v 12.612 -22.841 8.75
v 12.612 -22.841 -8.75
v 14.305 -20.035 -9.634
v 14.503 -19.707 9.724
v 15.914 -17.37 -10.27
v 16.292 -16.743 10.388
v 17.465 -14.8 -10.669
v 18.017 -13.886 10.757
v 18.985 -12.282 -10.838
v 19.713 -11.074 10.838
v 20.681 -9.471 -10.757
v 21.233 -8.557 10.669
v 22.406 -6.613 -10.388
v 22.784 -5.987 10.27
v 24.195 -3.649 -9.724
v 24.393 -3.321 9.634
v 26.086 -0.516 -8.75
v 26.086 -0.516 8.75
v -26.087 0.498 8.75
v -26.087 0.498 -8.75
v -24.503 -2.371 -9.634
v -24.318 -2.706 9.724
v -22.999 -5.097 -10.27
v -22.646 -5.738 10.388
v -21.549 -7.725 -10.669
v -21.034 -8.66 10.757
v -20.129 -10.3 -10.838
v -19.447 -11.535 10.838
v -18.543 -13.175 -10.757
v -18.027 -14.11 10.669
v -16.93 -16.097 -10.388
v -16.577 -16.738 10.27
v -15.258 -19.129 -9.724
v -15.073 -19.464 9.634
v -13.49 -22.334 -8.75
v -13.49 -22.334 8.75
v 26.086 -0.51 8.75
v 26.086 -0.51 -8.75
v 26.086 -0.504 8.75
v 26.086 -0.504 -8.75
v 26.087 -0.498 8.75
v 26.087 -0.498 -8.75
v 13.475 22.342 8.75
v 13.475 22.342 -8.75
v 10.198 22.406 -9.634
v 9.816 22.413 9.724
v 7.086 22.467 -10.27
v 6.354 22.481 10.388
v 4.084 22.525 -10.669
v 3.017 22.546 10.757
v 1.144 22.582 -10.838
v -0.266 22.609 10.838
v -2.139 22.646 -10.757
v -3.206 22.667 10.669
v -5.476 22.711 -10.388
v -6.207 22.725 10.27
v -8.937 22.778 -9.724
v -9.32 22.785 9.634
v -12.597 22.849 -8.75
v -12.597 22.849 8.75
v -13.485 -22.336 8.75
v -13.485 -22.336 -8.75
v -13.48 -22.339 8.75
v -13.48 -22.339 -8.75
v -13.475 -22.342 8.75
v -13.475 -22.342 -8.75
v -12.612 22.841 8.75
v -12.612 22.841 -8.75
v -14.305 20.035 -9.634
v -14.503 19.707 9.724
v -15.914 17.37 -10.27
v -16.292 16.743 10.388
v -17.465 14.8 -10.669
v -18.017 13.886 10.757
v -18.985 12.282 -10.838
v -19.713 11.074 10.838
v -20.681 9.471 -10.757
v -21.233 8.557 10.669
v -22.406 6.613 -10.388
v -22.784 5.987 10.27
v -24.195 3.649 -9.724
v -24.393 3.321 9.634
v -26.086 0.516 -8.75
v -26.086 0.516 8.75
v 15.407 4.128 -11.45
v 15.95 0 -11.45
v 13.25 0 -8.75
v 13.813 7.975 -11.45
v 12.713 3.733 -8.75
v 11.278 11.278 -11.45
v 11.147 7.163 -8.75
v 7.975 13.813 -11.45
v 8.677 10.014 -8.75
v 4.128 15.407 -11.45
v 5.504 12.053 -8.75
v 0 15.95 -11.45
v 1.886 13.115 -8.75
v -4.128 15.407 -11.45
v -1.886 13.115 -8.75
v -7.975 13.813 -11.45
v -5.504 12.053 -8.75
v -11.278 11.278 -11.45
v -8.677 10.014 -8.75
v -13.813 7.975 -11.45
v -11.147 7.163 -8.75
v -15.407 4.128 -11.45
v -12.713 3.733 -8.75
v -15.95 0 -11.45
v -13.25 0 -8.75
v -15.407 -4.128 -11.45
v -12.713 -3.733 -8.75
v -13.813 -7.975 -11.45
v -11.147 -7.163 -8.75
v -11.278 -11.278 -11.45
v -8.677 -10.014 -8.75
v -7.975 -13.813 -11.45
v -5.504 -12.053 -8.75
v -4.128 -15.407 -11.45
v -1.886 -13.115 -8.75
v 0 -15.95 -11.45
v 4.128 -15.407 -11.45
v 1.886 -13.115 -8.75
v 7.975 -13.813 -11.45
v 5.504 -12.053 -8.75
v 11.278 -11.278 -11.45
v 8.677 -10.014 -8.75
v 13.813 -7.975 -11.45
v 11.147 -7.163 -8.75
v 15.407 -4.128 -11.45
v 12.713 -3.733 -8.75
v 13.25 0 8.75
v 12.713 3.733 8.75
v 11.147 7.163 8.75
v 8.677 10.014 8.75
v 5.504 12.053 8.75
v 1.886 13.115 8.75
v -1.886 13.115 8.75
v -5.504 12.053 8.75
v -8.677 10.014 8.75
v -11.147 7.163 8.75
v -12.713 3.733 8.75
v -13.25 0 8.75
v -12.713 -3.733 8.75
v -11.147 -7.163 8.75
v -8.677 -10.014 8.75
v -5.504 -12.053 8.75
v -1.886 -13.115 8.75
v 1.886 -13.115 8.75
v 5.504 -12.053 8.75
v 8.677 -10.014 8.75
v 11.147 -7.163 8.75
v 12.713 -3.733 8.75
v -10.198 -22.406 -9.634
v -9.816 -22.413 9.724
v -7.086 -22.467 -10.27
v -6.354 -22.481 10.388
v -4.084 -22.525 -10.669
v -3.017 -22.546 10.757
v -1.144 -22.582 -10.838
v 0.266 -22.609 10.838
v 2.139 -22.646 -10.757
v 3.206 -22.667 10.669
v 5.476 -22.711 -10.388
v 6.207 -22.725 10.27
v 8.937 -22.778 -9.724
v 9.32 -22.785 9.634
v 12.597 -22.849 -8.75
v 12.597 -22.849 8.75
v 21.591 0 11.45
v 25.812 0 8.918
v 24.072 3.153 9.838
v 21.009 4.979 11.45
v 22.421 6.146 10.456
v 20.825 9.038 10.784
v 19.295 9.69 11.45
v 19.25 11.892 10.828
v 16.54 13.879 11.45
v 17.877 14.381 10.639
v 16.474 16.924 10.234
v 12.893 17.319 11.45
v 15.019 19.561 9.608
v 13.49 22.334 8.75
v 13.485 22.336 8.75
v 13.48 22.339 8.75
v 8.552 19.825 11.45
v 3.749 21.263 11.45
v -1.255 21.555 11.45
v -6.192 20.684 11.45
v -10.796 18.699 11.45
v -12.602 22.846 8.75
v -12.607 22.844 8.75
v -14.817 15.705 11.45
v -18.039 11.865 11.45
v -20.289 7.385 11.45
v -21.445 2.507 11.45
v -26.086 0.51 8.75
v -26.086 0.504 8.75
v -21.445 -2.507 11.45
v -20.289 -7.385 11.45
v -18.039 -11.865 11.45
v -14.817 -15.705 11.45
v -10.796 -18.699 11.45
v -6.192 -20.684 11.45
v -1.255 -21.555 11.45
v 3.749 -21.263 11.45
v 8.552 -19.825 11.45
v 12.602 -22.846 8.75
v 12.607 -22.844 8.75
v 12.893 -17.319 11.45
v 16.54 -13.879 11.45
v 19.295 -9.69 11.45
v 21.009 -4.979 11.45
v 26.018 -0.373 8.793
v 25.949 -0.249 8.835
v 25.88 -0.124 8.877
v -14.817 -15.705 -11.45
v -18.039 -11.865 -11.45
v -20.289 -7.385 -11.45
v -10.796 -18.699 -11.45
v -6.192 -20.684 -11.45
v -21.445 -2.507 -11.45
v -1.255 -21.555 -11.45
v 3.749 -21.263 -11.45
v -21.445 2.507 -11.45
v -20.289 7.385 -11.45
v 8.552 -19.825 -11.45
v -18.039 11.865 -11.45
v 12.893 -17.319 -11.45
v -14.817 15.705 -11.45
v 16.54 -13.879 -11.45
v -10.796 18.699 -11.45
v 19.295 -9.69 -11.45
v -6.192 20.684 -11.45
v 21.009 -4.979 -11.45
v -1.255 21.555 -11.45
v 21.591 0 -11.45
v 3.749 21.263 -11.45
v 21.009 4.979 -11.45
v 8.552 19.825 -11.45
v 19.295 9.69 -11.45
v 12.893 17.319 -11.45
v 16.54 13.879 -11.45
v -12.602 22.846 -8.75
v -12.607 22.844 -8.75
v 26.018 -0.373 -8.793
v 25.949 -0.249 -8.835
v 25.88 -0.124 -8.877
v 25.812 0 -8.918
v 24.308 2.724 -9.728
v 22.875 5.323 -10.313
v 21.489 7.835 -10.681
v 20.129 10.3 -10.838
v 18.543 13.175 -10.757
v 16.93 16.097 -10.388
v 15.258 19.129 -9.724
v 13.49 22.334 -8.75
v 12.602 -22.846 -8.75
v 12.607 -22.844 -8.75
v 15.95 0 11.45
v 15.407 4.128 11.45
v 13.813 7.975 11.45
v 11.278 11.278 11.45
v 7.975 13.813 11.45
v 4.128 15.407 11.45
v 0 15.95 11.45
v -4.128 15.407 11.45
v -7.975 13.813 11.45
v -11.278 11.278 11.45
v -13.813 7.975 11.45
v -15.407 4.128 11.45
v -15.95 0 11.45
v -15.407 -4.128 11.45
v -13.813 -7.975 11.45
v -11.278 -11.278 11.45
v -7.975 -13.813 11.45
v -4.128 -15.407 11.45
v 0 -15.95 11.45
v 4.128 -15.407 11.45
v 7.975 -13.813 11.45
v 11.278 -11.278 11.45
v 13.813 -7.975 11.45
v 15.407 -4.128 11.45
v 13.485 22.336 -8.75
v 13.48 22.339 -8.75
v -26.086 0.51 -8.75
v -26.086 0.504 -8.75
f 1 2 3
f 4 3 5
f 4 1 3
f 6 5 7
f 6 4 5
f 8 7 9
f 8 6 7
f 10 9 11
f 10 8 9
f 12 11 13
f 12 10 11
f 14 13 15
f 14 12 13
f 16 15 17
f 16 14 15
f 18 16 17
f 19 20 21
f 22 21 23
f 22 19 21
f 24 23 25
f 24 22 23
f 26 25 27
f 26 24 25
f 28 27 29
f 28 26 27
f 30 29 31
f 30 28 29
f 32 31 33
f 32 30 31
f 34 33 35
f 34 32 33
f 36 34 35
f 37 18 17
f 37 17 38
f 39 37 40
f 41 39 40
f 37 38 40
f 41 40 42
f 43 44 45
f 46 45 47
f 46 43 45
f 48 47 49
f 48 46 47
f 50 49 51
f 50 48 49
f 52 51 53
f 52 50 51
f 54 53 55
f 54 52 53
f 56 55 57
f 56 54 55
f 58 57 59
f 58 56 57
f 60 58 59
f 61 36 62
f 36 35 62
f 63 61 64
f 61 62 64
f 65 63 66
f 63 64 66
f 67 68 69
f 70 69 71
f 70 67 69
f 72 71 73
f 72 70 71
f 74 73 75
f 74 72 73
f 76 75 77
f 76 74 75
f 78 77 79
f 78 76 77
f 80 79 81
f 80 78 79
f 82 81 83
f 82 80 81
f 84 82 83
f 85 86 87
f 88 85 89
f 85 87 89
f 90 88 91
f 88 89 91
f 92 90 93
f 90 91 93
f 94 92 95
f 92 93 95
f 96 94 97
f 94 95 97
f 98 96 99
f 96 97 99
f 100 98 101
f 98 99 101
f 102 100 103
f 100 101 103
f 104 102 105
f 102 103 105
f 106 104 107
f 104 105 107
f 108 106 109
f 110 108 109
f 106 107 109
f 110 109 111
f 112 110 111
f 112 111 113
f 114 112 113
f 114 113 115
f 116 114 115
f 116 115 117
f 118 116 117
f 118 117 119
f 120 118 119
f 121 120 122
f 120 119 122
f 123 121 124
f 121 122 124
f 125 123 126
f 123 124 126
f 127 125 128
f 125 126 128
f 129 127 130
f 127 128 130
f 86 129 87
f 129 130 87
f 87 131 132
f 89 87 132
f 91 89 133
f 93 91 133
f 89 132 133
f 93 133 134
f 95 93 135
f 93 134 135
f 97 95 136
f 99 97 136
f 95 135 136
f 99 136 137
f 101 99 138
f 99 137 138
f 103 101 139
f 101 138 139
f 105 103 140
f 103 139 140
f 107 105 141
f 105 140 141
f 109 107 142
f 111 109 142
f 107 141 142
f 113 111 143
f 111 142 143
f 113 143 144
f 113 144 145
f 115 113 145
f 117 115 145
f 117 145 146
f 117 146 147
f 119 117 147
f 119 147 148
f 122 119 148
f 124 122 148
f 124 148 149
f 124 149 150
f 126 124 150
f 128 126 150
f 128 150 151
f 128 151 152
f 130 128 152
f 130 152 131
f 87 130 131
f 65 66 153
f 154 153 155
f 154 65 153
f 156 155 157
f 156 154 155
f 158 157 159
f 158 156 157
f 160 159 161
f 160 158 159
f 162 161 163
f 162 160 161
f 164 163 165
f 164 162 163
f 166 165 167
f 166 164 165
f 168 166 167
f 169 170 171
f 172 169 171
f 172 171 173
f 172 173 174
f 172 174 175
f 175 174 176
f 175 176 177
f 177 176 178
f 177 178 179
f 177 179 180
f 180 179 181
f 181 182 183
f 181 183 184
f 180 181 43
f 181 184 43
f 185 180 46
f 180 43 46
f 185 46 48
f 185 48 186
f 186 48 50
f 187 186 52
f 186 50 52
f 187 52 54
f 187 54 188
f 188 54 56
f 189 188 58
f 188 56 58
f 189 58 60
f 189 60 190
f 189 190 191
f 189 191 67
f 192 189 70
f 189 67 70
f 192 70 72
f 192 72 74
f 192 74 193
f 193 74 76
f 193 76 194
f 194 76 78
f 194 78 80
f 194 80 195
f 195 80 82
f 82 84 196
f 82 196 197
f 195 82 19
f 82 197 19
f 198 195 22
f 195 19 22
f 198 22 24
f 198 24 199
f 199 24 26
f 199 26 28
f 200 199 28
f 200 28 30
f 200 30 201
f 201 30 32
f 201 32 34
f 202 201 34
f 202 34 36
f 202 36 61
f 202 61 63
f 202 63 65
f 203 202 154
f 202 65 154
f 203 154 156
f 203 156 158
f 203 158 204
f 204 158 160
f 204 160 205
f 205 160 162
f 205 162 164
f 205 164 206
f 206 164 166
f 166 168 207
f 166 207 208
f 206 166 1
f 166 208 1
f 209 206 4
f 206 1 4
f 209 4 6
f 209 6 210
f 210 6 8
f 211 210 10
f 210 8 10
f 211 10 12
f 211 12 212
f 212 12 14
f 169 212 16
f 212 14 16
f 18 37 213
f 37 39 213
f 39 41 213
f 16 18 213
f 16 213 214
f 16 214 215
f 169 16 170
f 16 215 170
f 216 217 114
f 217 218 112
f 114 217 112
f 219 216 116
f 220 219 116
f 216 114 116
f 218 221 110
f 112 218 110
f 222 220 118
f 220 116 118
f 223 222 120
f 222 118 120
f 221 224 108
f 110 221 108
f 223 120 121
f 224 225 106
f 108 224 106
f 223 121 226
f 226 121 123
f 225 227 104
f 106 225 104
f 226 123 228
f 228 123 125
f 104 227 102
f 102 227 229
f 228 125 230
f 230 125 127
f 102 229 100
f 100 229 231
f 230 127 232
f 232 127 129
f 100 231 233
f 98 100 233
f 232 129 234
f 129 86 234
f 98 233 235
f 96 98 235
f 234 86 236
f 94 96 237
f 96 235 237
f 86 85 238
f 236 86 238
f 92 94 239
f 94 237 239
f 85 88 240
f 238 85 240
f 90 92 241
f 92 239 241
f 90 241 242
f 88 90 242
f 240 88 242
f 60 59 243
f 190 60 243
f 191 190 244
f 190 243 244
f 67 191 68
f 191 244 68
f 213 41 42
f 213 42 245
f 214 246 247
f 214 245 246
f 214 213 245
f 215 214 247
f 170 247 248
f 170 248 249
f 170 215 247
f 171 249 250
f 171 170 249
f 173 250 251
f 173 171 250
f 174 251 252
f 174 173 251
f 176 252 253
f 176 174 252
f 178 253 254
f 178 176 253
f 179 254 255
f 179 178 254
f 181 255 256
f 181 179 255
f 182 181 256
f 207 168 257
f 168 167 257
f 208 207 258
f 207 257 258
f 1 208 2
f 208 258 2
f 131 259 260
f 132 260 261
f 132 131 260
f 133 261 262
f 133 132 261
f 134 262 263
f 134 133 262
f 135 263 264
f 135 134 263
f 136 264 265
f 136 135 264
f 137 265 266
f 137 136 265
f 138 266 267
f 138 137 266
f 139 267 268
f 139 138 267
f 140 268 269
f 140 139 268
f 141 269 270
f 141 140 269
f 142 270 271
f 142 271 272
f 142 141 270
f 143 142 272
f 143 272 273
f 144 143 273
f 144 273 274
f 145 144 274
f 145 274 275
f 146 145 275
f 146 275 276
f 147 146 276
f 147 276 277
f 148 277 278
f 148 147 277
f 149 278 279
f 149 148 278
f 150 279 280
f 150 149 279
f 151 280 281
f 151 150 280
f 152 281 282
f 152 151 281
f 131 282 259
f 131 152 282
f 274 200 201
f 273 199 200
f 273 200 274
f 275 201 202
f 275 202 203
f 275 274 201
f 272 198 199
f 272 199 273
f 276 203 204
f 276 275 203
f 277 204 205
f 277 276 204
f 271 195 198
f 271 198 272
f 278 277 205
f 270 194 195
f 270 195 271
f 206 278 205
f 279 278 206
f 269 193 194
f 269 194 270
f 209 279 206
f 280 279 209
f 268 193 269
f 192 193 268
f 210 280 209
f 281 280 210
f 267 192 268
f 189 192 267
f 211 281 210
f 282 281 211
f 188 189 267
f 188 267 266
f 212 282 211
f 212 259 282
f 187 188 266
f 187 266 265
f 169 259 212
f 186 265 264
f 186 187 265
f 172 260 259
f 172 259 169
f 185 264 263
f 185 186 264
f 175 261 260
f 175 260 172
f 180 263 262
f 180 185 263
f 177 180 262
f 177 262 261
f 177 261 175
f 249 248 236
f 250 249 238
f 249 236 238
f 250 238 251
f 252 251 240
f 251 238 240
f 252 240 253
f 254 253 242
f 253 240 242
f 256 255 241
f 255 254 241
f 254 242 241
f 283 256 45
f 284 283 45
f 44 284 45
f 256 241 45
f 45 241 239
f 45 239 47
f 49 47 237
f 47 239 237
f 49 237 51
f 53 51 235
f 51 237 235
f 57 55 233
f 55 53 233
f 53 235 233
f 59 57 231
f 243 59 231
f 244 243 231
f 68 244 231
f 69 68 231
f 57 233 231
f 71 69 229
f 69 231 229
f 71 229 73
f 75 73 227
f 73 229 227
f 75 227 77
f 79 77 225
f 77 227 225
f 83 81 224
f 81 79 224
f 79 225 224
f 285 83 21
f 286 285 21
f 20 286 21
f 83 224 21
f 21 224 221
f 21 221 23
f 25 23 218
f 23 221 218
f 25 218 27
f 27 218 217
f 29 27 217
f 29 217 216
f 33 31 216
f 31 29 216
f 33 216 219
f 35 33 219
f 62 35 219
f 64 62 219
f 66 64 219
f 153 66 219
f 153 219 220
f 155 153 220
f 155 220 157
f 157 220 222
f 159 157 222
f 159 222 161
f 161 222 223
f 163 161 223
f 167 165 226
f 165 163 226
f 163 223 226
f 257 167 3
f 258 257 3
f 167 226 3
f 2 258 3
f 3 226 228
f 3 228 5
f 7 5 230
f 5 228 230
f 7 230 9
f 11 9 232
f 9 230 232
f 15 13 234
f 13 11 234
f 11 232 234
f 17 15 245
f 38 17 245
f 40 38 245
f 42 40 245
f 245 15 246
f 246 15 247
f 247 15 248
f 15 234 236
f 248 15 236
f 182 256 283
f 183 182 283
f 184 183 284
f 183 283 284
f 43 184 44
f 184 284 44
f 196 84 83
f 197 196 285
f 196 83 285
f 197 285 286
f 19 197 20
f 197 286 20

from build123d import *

# Parameters (mm, degrees)
F1_DEPTH = 11.45
F2_R     = 13.25
F3_DEPTH = 22.901
F6_SIZE  = 2.7


with BuildPart() as f1:
    # F0 (on Top) → F1 (new body, symmetric)
    with BuildSketch(Plane.XY):
        Polygon((12.606495, -22.84928), (26.091305, -0.507095), (13.484809, 22.342185), (-12.606495, 22.84928), (-26.091305, 0.507095), (-13.484809, -22.342185), align=None)
    extrude(amount=F1_DEPTH, both=True)

    # F2 (on face) → F3 (cut, through all)
    with BuildSketch(Plane.XY.offset(11.45)):
        Circle(F2_R)
    extrude(amount=-F3_DEPTH, mode=Mode.SUBTRACT)

    # F4 (on Front) → F5 (revolve, cut)
    with BuildSketch(Plane.XZ):
        Polygon((34.293845, 11.45), (21.591305, 11.45), (26.091305, 8.75), (26.091305, -8.75), (21.591305, -11.45), (34.293845, -11.45), align=None)
    revolve(axis=Axis((0, 0, 11.45), (0, 0, 1)), mode=Mode.SUBTRACT)

    # F6
    f6_edges = [f1.edges().sort_by_distance(p)[0] for p in [
        (-13.25, 0, 11.45),
        (-13.25, 0, -11.45),
    ]]
    chamfer(f6_edges, length=F6_SIZE)


solid = f1.part
